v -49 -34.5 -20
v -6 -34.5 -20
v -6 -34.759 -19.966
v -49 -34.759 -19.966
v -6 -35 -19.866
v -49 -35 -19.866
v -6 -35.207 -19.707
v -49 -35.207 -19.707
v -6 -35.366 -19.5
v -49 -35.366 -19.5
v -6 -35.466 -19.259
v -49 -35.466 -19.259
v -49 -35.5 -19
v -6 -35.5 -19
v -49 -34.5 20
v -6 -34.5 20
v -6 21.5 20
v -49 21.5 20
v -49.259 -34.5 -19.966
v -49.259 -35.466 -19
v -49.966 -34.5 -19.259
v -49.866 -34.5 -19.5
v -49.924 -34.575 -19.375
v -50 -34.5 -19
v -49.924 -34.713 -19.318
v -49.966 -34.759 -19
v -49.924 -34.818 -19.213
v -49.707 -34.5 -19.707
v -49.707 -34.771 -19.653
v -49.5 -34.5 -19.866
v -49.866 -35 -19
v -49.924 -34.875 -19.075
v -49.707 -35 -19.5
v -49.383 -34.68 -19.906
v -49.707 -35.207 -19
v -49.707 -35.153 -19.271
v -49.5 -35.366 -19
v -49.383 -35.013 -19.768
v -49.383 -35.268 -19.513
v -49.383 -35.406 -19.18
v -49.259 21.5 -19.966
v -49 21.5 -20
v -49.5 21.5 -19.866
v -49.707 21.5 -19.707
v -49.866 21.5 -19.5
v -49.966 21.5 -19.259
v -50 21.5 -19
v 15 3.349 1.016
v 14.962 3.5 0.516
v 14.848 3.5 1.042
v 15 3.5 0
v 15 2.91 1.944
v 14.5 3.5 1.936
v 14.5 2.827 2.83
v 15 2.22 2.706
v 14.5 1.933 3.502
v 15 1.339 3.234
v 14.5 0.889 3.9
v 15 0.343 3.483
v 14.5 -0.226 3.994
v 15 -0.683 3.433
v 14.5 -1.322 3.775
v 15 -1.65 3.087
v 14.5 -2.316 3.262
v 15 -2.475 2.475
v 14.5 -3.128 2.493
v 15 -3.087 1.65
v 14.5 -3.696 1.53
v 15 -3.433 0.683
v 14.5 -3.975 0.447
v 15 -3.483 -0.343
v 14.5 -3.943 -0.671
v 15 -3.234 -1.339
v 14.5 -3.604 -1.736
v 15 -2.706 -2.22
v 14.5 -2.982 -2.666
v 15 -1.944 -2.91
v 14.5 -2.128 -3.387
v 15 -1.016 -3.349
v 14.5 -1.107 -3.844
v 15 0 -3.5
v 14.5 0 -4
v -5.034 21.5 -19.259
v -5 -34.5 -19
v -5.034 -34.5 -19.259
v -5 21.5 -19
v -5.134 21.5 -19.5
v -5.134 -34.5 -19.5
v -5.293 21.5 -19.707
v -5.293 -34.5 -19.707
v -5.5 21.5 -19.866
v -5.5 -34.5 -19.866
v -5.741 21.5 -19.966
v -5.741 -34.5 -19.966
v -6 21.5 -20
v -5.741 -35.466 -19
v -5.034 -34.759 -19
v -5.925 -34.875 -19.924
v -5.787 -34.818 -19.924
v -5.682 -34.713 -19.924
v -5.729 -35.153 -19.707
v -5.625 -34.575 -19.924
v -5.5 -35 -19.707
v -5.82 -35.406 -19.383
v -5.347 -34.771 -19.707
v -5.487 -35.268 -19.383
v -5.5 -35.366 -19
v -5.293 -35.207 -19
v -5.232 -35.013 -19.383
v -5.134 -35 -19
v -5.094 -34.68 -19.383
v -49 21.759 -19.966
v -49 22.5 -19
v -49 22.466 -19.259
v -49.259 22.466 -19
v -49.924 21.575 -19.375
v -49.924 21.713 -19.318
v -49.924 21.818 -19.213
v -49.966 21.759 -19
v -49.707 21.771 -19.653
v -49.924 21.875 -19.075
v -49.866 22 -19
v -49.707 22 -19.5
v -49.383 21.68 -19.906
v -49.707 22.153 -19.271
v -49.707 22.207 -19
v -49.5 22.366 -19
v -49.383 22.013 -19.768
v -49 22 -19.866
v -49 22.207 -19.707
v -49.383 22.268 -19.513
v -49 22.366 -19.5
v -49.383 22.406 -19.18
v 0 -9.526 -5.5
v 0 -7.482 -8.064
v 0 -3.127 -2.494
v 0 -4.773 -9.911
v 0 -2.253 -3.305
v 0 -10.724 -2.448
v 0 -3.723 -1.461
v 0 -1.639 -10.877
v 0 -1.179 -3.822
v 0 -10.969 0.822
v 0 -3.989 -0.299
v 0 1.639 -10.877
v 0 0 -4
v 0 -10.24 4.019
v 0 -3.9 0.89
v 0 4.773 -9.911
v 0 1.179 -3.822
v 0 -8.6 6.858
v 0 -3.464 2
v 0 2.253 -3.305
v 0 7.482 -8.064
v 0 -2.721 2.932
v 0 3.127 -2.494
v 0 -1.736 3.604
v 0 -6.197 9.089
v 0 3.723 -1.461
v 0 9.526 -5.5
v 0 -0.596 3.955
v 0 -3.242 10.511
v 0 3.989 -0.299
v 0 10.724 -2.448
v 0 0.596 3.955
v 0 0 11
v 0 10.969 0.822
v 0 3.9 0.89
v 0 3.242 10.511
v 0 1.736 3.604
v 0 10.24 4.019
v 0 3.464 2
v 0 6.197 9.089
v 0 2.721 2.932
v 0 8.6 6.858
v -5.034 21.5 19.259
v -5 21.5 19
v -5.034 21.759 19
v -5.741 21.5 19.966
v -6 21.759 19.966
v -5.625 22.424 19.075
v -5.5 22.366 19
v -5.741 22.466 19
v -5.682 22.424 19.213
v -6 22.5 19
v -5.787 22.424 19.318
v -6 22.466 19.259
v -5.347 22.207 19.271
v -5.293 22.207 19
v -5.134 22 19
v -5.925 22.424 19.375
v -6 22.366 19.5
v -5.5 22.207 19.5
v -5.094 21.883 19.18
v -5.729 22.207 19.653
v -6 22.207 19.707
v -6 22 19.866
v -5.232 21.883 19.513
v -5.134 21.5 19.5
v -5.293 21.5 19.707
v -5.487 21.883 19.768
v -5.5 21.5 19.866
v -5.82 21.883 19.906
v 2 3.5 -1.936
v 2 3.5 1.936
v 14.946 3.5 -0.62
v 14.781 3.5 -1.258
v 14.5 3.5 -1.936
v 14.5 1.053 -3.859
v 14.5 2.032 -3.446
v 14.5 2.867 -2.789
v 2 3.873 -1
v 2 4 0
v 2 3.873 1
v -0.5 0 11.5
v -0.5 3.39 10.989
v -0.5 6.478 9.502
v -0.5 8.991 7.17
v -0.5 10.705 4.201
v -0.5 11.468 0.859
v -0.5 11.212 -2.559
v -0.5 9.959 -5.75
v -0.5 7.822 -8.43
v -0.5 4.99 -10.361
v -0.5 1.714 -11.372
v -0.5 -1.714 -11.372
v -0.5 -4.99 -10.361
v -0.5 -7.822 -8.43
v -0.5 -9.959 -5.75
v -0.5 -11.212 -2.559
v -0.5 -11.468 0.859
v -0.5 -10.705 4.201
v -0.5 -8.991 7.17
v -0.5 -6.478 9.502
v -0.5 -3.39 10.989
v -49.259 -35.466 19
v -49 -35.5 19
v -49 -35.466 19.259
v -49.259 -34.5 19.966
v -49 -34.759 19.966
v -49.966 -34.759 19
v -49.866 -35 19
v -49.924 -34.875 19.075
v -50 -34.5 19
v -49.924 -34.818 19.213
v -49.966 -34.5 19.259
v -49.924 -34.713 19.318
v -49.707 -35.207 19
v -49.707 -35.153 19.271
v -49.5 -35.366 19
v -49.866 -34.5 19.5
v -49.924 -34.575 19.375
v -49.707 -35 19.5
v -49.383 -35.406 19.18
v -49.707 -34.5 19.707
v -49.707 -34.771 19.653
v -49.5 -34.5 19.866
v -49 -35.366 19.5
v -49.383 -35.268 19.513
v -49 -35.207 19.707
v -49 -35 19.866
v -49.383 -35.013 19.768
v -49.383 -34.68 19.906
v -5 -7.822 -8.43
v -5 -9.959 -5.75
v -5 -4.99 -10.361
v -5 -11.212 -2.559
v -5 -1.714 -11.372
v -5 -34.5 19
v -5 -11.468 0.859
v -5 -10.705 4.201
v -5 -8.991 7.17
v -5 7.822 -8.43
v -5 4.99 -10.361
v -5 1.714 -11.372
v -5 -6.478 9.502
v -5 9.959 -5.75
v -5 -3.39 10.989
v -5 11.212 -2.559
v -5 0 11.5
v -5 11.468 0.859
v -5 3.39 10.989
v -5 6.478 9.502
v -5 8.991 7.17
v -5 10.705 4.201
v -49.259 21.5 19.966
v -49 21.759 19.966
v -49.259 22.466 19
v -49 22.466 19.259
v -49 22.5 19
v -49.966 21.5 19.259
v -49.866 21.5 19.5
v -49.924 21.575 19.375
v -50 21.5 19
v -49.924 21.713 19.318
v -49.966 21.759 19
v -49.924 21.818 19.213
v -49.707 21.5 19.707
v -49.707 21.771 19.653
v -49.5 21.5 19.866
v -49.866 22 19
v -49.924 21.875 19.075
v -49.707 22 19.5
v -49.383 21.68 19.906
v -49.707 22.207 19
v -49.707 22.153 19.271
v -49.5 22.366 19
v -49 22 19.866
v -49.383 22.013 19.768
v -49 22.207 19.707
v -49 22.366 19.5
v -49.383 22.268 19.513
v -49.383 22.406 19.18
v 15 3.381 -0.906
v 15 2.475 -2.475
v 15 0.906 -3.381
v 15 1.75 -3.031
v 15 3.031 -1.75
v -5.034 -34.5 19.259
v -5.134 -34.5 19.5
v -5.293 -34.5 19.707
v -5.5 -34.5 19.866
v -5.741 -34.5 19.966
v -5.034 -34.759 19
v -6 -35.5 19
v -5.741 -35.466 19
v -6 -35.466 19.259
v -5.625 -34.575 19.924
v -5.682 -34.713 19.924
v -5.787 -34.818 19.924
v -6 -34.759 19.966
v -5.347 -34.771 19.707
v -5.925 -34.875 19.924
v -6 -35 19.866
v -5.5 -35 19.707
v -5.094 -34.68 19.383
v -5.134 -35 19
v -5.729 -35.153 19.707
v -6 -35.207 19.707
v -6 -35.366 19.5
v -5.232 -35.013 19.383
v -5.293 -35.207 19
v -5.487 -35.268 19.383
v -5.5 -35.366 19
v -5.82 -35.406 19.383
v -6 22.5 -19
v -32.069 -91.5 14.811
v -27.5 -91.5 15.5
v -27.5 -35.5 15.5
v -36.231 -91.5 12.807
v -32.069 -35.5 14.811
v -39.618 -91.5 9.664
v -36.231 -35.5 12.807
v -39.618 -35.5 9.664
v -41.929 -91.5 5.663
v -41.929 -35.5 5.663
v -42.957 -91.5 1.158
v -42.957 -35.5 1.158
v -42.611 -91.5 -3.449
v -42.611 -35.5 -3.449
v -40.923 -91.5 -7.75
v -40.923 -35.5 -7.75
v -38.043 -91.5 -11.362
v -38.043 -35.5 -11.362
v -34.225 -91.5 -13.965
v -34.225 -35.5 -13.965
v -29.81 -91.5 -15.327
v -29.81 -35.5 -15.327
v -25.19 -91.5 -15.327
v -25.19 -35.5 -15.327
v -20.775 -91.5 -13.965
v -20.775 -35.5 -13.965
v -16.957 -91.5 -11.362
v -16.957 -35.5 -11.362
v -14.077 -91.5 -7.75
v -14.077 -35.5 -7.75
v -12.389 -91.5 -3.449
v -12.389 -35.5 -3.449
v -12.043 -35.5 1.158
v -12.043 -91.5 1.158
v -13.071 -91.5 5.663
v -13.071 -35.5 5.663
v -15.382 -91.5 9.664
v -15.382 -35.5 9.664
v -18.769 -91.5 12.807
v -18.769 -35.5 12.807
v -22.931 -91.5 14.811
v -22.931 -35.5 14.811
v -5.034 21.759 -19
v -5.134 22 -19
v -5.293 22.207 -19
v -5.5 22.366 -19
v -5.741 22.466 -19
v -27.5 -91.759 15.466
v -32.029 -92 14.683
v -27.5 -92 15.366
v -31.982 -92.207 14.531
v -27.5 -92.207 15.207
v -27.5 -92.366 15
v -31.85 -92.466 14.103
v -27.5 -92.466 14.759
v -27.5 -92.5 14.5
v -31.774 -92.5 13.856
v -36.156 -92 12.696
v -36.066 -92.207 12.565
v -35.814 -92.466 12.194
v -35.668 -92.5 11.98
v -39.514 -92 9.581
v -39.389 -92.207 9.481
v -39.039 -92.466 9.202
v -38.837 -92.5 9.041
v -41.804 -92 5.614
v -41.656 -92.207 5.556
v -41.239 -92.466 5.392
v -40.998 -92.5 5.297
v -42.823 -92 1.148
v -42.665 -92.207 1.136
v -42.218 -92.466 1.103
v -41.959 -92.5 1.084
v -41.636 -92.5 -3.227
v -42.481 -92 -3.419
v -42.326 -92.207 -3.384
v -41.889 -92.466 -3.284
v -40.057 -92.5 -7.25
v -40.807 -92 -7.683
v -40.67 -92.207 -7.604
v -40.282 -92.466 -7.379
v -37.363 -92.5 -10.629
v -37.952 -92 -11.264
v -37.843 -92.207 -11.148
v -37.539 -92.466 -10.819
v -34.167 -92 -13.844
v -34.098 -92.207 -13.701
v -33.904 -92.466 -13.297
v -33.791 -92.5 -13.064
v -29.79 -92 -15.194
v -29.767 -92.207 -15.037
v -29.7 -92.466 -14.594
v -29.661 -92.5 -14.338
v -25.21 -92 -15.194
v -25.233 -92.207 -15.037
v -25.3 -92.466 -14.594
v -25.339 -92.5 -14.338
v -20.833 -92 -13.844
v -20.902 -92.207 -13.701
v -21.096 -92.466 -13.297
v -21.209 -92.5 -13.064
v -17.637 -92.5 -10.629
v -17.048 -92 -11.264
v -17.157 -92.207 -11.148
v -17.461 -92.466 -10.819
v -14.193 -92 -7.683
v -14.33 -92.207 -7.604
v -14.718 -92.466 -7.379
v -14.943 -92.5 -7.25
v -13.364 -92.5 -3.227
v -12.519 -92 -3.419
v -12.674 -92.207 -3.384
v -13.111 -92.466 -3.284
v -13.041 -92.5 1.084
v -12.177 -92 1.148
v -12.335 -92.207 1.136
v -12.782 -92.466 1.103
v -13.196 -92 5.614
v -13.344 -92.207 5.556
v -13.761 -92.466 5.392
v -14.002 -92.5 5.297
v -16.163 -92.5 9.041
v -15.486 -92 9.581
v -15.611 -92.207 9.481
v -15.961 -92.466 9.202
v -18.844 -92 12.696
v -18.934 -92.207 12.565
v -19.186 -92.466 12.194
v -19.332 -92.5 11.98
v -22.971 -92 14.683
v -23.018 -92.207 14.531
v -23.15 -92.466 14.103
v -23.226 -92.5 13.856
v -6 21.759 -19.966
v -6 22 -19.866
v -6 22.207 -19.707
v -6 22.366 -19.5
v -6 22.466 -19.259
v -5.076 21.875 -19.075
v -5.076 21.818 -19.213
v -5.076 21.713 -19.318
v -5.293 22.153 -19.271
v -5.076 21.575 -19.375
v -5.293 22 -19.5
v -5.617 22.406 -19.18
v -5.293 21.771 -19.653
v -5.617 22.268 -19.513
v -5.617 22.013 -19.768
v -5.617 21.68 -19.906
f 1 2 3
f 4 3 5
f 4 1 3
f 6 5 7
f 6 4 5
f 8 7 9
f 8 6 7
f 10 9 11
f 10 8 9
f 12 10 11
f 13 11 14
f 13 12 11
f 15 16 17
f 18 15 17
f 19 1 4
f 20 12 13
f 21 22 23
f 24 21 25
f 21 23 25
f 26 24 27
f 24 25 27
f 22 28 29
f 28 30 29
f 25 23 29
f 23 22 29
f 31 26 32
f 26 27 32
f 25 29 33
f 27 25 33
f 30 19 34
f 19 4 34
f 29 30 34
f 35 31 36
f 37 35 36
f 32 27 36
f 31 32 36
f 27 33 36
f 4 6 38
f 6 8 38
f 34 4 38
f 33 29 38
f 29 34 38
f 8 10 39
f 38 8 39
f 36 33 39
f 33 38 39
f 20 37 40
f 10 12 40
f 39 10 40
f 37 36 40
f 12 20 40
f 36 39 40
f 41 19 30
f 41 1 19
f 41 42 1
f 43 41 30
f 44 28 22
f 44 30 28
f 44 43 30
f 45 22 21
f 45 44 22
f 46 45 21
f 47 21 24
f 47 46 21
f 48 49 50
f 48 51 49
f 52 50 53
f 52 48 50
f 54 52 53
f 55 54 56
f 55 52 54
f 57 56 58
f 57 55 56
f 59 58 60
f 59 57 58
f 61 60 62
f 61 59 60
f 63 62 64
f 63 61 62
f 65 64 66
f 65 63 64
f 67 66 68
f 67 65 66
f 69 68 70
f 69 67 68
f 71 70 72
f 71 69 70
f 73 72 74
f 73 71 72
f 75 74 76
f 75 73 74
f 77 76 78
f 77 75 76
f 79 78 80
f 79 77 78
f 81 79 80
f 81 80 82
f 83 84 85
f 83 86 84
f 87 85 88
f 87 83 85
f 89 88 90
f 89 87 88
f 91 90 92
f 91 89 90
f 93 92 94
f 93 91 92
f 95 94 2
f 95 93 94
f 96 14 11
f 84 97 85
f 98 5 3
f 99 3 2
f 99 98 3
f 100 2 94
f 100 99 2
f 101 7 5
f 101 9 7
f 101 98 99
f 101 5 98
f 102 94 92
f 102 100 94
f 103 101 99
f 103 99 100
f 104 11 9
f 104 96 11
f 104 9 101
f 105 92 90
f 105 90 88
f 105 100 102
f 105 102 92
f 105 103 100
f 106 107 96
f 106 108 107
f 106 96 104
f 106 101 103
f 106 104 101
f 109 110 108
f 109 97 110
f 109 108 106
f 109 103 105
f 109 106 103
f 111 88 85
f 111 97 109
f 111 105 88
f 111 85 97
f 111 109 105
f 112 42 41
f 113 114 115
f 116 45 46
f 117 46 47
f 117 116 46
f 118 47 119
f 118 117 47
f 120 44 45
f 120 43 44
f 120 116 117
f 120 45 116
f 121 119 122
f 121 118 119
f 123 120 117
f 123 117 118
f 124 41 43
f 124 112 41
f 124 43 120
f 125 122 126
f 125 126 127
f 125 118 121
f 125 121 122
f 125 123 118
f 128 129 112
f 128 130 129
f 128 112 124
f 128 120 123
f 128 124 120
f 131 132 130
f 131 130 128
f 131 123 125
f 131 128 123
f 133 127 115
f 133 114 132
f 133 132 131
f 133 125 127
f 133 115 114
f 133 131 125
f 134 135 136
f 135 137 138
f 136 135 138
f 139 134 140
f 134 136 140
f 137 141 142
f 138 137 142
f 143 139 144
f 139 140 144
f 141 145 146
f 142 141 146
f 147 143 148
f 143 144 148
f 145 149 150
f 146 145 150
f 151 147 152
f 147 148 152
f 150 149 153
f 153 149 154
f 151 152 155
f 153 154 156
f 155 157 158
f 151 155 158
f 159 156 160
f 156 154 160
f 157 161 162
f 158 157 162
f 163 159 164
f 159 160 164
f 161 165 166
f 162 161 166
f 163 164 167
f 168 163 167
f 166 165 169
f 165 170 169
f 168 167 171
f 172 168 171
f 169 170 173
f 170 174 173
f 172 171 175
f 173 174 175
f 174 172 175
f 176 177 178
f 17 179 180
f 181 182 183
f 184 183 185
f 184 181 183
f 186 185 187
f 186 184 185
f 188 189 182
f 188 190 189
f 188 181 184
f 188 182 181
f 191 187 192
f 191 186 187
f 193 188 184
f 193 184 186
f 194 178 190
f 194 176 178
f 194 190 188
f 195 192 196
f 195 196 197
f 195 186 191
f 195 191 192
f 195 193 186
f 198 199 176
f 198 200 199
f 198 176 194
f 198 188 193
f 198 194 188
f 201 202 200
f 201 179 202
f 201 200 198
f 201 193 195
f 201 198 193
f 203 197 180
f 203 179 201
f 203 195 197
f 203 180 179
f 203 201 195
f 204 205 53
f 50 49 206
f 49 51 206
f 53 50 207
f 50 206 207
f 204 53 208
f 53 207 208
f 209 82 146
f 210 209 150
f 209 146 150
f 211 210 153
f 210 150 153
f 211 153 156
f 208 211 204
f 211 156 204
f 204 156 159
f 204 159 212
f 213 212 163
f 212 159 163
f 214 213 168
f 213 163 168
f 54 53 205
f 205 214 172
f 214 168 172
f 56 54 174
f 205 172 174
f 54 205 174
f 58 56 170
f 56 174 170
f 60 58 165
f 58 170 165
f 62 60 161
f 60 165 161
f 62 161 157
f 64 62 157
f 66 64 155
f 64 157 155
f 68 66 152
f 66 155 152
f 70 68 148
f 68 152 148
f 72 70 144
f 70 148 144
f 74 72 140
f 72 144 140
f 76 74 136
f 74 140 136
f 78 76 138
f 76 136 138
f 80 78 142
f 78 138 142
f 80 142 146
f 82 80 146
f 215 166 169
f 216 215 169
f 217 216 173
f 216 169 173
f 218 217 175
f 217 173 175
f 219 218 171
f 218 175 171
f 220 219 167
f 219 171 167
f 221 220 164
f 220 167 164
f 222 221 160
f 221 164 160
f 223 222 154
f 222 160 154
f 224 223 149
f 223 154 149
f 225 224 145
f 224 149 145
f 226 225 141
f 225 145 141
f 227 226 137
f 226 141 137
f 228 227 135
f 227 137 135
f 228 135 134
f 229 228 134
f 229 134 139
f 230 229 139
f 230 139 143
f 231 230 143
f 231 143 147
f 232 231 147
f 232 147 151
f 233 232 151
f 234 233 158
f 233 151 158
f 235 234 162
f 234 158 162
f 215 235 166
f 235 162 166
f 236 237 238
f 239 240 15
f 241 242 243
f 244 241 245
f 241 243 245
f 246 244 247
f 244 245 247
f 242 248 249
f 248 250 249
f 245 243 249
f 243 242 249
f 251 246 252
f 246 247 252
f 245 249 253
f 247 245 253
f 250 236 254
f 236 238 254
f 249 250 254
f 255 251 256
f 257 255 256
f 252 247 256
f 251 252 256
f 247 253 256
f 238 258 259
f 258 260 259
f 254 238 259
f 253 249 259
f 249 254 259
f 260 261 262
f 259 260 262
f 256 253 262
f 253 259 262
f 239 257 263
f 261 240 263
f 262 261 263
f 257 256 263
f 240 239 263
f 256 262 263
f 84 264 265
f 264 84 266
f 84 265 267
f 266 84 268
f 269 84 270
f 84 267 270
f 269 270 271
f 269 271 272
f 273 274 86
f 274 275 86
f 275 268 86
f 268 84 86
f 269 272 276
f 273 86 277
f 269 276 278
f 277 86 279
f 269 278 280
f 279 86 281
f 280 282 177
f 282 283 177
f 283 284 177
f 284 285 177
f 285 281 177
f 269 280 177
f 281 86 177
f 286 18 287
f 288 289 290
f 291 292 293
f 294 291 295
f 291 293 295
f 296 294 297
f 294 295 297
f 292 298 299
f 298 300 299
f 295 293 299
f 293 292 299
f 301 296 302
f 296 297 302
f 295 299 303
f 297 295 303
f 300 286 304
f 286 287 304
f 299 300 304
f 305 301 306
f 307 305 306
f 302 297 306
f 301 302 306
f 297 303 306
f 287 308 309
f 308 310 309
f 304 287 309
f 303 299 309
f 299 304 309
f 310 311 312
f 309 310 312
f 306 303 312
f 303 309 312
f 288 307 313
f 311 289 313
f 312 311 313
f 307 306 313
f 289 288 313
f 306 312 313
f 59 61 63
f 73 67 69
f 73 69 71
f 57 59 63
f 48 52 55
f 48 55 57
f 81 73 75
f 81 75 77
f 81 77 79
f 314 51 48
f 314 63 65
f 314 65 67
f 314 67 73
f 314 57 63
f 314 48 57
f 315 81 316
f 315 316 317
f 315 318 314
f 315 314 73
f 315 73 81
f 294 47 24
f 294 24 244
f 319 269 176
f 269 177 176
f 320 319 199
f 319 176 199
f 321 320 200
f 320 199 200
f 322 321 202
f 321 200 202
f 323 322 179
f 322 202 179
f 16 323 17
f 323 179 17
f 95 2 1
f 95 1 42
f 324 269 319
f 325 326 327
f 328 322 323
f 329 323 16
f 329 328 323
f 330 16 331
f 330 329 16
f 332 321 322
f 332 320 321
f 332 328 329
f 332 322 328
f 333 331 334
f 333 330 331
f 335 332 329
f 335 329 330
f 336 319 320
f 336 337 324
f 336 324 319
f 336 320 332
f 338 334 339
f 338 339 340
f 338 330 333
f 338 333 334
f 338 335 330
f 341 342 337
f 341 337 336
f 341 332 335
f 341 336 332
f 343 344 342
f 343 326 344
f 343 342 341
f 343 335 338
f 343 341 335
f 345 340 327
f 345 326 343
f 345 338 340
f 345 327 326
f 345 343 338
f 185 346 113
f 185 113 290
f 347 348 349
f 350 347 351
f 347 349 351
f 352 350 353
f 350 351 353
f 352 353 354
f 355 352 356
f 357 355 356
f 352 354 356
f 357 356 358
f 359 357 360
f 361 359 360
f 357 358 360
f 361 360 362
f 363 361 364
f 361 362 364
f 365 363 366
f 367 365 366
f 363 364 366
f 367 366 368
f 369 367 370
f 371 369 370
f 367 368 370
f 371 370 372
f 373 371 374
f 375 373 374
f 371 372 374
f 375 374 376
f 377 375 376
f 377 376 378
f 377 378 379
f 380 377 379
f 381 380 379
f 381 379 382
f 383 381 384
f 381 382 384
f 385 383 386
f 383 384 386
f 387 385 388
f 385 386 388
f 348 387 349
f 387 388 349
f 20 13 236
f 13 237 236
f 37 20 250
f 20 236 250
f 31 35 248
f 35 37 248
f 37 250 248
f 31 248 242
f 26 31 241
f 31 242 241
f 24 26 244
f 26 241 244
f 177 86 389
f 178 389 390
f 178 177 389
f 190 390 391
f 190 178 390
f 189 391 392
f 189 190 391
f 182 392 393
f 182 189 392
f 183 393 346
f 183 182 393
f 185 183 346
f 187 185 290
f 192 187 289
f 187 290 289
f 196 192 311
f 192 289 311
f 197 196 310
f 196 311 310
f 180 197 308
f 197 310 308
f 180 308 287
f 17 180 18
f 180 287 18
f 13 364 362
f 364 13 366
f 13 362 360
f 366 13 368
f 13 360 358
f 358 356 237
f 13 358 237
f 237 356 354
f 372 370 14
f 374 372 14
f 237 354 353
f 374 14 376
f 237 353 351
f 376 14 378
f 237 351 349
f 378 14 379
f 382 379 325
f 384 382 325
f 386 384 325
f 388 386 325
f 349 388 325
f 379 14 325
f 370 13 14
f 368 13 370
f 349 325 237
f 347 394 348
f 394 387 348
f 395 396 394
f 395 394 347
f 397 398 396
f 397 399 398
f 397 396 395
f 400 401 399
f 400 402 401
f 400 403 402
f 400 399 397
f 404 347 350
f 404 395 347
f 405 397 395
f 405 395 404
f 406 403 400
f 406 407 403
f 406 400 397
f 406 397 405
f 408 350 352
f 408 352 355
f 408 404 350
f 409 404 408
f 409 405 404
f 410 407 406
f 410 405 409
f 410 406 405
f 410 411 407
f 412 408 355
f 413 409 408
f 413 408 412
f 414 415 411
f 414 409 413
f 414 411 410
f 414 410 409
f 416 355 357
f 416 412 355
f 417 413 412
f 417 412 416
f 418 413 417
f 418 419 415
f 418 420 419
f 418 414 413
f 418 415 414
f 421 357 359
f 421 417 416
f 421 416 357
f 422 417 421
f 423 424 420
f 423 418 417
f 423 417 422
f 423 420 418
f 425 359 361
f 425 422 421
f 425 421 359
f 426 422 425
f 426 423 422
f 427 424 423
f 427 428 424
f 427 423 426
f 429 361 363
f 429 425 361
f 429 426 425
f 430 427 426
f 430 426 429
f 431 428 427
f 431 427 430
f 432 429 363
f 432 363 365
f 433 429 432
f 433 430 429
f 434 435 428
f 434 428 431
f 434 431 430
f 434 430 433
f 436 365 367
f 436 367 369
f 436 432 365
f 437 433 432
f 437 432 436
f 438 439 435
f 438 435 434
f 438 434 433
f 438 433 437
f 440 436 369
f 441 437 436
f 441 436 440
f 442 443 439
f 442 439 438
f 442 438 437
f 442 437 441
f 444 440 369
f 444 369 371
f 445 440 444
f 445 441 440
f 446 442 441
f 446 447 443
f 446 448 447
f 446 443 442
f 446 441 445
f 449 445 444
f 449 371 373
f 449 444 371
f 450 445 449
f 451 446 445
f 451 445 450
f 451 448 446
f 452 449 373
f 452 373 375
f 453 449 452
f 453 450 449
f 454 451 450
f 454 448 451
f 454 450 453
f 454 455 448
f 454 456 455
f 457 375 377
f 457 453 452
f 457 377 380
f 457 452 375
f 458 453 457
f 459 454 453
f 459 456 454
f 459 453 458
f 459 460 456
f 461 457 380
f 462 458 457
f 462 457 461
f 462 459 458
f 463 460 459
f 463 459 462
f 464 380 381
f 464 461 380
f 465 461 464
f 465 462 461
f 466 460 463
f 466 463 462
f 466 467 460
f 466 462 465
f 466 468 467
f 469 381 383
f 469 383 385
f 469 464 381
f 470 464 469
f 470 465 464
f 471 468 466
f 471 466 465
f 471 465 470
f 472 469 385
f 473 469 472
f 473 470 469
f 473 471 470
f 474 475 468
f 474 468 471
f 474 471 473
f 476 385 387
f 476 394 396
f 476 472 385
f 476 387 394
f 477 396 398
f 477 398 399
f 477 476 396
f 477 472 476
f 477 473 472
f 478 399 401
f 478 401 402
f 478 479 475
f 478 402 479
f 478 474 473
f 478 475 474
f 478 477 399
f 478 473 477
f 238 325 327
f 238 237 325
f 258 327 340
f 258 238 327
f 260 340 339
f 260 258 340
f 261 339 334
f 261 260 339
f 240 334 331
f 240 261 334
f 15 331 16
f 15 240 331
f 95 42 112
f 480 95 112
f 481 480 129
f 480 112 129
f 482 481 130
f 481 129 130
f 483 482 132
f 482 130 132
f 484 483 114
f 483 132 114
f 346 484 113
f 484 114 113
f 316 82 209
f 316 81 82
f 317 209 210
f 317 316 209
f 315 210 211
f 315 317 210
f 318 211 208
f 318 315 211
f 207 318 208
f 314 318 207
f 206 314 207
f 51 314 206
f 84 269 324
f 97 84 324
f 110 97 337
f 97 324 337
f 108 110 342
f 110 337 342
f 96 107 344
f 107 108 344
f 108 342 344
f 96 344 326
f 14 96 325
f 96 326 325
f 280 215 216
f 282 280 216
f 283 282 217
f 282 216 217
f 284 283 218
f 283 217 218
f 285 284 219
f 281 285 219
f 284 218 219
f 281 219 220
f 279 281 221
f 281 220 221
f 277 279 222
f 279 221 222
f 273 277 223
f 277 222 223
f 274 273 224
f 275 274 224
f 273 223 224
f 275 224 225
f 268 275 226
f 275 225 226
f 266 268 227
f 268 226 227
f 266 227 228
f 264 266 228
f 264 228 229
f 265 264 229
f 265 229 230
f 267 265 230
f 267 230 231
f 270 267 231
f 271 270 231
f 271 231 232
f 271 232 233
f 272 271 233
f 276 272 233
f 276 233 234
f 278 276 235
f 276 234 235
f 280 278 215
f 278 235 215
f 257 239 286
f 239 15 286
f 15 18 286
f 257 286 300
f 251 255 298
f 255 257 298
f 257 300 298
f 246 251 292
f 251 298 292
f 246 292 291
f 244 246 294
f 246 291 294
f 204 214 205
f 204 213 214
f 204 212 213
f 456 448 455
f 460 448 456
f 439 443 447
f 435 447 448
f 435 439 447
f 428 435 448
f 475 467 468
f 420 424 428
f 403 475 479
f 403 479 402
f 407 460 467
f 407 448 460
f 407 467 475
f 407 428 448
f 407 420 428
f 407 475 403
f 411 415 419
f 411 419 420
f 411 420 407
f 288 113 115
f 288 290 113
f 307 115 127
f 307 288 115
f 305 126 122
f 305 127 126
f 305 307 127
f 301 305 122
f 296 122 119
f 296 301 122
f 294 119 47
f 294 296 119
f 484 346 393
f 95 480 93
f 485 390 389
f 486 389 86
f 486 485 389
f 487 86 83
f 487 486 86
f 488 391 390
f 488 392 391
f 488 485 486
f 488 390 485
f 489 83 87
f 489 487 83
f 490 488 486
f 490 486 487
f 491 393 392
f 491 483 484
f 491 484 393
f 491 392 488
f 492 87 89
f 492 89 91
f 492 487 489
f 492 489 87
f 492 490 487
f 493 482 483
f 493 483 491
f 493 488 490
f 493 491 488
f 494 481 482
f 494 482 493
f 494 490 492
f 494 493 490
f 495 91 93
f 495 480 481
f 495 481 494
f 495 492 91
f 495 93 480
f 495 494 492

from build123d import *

# Parameters (mm, degrees)
SKETCH1_R           = 4
BOSS_EXTRUDE1_DEPTH = 15
SKETCH2_R           = 11.5
BOSS_EXTRUDE2_DEPTH = 5
SKETCH3_W           = 40
SKETCH3_H           = 58
BOSS_EXTRUDE3_DEPTH = 45
SKETCH6_R           = 15.5
BOSS_EXTRUDE4_DEPTH = 57
CHAMFER1_SIZE       = 0.5
FILLET1_R           = 1
SKETCH4_W           = 3.872983346
SKETCH4_H           = 7.5
CUT_EXTRUDE1_DEPTH  = 13


with BuildPart() as part:
    # Sketch1 → Boss-Extrude1 (new body)
    with BuildSketch(Plane(origin=(0, 0, 0), x_dir=(0, 0, -1), z_dir=(1, 0, 0))):
        Circle(SKETCH1_R)
    extrude(amount=BOSS_EXTRUDE1_DEPTH)

    # Sketch2 → Boss-Extrude2 (add)
    with BuildSketch(Plane.ZY):
        Circle(SKETCH2_R)
    extrude(amount=BOSS_EXTRUDE2_DEPTH)

    # Sketch3 → Boss-Extrude3 (add)
    with BuildSketch(Plane.ZY.offset(5)):
        with Locations((0, -6.5)):
            Rectangle(SKETCH3_W, SKETCH3_H)
    extrude(amount=BOSS_EXTRUDE3_DEPTH)

    # Sketch6 → Boss-Extrude4 (add)
    with BuildSketch(Plane.XZ.offset(35.5)):
        with Locations(Location((-27.5, 0, 0), (0, 0, 90))):
            Circle(SKETCH6_R)
    extrude(amount=BOSS_EXTRUDE4_DEPTH)

    # Chamfer1
    chamfer1_edges = [part.edges().sort_by_distance(p)[0] for p in [
        (15, 0, 4),
        (0, 0, -11.5),
    ]]
    chamfer(chamfer1_edges, length=CHAMFER1_SIZE)

    # Fillet1
    fillet1_edges = [part.edges().sort_by_distance(p)[0] for p in [
        (-27.5, 22.5, -20),
        (-5, -35.5, 0),
        (-27.5, -35.5, -20),
        (-5, -6.5, 20),
        (-27.5, -35.5, 20),
        (-5, 22.5, 0),
        (-27.5, 22.5, 20),
        (-50, -6.5, -20),
        (-50, -35.5, 0),
        (-50, -6.5, 20),
        (-50, 22.5, 0),
        (-27.5, -92.5, -15.5),
        (-5, -6.5, -20),
    ]]
    fillet(fillet1_edges, radius=FILLET1_R)

    # Sketch4 → Cut-Extrude1 (cut)
    with BuildSketch(Plane(origin=(15, 0, 0), x_dir=(0, 0, -1), z_dir=(1, 0, 0))):
        with Locations((0, 7.25)):
            Rectangle(SKETCH4_W, SKETCH4_H)
    extrude(amount=-CUT_EXTRUDE1_DEPTH, mode=Mode.SUBTRACT)


solid = part.part
